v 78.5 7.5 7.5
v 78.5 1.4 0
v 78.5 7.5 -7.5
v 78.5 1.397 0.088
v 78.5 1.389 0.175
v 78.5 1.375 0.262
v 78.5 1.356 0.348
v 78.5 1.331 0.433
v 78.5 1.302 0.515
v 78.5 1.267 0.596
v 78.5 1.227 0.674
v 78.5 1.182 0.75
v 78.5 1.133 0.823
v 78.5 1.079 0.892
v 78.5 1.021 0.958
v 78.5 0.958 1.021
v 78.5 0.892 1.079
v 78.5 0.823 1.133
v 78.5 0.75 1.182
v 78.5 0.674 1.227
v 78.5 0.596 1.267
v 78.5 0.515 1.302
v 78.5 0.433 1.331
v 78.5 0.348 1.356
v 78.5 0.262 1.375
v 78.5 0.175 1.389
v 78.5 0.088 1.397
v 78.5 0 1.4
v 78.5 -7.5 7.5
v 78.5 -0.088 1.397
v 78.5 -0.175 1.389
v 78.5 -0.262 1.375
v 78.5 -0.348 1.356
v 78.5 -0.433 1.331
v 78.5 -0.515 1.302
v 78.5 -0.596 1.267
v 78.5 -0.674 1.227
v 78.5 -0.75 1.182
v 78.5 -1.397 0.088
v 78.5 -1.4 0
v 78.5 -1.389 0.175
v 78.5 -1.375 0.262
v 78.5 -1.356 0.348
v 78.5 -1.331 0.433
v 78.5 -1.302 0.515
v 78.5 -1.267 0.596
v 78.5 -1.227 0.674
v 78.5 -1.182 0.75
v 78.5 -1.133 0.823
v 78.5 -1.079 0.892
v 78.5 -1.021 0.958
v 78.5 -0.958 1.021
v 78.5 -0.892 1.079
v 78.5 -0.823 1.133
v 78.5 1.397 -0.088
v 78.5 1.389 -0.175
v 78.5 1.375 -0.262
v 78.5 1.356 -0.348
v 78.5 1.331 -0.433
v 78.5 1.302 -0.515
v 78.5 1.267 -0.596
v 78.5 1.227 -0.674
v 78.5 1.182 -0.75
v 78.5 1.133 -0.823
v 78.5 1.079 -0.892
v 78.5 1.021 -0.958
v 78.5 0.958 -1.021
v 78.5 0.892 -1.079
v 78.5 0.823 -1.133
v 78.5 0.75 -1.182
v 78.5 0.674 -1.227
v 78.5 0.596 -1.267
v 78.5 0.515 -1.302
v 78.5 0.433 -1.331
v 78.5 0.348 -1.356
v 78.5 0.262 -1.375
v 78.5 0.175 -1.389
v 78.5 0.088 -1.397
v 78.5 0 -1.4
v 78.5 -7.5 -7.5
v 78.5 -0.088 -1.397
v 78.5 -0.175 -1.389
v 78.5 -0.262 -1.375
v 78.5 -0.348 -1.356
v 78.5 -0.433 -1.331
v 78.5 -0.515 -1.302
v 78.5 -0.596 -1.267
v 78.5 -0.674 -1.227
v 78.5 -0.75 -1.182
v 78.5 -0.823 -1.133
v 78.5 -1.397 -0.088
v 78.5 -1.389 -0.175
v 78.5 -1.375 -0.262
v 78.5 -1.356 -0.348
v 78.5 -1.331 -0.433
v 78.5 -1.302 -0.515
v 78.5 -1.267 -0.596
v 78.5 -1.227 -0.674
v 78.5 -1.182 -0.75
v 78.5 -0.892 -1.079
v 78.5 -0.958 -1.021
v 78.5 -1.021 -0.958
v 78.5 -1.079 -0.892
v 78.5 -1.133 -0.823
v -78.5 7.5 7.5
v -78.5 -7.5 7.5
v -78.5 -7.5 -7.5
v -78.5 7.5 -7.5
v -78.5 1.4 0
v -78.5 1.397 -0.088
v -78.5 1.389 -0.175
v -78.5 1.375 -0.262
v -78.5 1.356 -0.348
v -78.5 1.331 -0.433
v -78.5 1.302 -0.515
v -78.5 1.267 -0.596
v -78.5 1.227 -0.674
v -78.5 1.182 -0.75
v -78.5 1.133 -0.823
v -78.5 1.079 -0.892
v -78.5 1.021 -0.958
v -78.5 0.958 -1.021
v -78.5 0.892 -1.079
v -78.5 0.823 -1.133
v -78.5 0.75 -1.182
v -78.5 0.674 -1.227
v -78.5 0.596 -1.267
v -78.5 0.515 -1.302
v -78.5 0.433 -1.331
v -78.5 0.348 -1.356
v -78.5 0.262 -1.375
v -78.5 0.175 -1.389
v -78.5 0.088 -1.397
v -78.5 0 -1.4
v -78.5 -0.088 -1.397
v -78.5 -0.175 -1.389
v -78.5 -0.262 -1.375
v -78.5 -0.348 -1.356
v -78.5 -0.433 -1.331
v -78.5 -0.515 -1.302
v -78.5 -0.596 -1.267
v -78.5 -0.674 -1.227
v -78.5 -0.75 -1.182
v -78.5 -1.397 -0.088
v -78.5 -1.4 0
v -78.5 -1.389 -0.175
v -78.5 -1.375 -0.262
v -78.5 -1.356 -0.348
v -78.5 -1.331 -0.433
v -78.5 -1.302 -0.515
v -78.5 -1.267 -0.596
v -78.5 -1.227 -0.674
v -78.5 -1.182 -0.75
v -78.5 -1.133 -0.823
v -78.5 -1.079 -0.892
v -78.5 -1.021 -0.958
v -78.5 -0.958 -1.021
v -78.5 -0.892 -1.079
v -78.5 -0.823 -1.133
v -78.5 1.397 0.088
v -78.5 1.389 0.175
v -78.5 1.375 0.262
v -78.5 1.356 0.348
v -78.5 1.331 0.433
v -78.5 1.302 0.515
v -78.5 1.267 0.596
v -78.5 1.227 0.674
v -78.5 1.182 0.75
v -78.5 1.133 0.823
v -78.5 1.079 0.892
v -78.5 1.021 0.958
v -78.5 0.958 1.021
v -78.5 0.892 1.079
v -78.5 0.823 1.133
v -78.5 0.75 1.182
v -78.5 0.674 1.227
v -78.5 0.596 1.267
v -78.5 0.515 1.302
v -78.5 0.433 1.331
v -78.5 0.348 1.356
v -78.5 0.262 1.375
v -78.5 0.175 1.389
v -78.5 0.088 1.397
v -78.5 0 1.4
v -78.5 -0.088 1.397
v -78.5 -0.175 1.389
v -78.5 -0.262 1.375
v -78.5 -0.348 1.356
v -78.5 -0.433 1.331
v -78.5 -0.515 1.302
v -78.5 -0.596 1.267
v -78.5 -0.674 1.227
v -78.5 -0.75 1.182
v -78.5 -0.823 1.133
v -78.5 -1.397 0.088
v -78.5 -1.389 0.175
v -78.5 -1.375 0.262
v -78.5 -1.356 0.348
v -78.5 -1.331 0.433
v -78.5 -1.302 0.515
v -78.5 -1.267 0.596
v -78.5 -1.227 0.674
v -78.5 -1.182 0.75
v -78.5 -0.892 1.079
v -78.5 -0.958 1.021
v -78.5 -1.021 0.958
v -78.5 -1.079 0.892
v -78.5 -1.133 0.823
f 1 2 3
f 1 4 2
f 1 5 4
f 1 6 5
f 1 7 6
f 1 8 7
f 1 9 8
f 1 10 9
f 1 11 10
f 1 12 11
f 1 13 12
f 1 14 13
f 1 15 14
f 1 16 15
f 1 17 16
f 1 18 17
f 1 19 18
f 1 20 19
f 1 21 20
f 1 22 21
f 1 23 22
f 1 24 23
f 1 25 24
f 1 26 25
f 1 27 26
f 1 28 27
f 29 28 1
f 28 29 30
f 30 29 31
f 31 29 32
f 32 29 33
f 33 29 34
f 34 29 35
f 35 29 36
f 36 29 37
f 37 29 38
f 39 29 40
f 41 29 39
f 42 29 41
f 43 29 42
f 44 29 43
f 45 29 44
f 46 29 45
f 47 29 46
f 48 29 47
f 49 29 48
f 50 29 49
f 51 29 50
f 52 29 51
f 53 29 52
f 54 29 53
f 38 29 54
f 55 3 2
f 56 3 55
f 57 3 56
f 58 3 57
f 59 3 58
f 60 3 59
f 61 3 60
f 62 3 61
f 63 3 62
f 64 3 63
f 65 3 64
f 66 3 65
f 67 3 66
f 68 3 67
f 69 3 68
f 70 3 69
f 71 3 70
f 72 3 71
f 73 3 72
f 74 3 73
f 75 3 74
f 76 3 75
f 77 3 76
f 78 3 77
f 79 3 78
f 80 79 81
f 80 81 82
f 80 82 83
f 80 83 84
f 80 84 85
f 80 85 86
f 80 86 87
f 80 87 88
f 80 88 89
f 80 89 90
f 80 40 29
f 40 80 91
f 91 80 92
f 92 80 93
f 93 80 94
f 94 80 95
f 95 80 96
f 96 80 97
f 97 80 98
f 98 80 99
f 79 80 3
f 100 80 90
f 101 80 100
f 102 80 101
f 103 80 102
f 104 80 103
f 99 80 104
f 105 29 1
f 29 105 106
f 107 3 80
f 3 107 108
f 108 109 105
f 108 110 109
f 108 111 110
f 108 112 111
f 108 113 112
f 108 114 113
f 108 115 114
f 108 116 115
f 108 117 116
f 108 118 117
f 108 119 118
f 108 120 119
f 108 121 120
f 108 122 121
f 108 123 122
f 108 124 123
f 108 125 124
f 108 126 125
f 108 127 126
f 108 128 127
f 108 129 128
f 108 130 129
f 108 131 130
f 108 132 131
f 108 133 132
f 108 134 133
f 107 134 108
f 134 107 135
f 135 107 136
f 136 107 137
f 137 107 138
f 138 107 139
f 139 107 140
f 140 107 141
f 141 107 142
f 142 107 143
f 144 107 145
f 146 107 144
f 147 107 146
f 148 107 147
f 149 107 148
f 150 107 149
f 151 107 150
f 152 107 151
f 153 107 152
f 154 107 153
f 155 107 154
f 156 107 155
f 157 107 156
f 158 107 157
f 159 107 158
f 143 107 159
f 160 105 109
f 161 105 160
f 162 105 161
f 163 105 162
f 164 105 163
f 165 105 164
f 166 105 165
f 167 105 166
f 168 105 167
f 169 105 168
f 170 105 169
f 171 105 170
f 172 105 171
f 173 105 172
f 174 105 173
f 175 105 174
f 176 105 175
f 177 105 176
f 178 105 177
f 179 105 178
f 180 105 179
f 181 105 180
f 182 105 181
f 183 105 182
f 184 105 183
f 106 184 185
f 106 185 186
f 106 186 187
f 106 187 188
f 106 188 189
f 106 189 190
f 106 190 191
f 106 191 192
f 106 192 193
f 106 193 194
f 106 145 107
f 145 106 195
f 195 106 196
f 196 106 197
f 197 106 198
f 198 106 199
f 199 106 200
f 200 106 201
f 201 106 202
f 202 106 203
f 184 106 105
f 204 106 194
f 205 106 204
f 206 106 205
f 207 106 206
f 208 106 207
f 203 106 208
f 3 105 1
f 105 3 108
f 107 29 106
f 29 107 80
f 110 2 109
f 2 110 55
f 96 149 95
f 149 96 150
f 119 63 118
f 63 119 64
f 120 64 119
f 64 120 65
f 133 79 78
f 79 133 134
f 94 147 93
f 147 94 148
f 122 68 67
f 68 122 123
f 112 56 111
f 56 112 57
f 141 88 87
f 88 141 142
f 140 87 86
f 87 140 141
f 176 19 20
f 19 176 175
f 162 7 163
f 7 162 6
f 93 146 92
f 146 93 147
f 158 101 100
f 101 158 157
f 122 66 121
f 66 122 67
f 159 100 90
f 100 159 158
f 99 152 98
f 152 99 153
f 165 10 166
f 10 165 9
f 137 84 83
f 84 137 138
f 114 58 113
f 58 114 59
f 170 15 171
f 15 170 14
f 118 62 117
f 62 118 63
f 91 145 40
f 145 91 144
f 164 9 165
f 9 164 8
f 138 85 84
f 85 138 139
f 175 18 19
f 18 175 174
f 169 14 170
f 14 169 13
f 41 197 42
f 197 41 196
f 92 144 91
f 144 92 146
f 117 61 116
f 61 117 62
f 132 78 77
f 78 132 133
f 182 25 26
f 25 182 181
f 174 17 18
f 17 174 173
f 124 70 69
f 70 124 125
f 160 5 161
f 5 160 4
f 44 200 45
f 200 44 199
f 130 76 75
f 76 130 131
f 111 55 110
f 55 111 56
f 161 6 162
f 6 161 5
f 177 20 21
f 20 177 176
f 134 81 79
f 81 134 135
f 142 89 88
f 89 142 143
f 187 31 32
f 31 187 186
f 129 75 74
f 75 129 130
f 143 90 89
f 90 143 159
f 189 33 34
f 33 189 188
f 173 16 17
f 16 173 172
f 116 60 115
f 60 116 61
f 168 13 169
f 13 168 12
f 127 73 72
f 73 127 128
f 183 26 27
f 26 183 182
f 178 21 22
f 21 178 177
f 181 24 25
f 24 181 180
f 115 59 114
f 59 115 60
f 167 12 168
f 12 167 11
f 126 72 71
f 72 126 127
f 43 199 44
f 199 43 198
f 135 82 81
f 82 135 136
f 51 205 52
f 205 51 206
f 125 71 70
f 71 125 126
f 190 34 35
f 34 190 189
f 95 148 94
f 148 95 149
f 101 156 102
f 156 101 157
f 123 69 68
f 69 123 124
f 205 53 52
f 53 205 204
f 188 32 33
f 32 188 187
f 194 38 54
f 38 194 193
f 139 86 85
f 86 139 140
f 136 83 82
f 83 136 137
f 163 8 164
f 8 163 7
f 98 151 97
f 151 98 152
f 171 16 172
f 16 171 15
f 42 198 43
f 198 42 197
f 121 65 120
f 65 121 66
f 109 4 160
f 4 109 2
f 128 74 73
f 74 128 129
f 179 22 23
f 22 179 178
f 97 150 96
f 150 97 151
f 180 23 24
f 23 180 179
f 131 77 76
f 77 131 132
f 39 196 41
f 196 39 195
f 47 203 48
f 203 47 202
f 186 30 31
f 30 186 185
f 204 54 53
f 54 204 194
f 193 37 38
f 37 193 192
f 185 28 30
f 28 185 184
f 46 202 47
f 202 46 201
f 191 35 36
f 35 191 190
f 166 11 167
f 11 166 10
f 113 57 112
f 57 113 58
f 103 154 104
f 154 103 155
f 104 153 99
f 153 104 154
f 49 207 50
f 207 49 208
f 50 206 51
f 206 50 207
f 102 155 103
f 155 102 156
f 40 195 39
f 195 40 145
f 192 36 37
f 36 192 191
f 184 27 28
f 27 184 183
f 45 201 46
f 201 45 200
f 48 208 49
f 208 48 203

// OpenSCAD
$fs = 0.01;
$fn = 100;

diam = 2.8;

difference()
{
    cube([157,15,15], true);

    color("green")
    rotate(90, [0,1,0])
    cylinder(200,diam/2,diam/2, true);
}
